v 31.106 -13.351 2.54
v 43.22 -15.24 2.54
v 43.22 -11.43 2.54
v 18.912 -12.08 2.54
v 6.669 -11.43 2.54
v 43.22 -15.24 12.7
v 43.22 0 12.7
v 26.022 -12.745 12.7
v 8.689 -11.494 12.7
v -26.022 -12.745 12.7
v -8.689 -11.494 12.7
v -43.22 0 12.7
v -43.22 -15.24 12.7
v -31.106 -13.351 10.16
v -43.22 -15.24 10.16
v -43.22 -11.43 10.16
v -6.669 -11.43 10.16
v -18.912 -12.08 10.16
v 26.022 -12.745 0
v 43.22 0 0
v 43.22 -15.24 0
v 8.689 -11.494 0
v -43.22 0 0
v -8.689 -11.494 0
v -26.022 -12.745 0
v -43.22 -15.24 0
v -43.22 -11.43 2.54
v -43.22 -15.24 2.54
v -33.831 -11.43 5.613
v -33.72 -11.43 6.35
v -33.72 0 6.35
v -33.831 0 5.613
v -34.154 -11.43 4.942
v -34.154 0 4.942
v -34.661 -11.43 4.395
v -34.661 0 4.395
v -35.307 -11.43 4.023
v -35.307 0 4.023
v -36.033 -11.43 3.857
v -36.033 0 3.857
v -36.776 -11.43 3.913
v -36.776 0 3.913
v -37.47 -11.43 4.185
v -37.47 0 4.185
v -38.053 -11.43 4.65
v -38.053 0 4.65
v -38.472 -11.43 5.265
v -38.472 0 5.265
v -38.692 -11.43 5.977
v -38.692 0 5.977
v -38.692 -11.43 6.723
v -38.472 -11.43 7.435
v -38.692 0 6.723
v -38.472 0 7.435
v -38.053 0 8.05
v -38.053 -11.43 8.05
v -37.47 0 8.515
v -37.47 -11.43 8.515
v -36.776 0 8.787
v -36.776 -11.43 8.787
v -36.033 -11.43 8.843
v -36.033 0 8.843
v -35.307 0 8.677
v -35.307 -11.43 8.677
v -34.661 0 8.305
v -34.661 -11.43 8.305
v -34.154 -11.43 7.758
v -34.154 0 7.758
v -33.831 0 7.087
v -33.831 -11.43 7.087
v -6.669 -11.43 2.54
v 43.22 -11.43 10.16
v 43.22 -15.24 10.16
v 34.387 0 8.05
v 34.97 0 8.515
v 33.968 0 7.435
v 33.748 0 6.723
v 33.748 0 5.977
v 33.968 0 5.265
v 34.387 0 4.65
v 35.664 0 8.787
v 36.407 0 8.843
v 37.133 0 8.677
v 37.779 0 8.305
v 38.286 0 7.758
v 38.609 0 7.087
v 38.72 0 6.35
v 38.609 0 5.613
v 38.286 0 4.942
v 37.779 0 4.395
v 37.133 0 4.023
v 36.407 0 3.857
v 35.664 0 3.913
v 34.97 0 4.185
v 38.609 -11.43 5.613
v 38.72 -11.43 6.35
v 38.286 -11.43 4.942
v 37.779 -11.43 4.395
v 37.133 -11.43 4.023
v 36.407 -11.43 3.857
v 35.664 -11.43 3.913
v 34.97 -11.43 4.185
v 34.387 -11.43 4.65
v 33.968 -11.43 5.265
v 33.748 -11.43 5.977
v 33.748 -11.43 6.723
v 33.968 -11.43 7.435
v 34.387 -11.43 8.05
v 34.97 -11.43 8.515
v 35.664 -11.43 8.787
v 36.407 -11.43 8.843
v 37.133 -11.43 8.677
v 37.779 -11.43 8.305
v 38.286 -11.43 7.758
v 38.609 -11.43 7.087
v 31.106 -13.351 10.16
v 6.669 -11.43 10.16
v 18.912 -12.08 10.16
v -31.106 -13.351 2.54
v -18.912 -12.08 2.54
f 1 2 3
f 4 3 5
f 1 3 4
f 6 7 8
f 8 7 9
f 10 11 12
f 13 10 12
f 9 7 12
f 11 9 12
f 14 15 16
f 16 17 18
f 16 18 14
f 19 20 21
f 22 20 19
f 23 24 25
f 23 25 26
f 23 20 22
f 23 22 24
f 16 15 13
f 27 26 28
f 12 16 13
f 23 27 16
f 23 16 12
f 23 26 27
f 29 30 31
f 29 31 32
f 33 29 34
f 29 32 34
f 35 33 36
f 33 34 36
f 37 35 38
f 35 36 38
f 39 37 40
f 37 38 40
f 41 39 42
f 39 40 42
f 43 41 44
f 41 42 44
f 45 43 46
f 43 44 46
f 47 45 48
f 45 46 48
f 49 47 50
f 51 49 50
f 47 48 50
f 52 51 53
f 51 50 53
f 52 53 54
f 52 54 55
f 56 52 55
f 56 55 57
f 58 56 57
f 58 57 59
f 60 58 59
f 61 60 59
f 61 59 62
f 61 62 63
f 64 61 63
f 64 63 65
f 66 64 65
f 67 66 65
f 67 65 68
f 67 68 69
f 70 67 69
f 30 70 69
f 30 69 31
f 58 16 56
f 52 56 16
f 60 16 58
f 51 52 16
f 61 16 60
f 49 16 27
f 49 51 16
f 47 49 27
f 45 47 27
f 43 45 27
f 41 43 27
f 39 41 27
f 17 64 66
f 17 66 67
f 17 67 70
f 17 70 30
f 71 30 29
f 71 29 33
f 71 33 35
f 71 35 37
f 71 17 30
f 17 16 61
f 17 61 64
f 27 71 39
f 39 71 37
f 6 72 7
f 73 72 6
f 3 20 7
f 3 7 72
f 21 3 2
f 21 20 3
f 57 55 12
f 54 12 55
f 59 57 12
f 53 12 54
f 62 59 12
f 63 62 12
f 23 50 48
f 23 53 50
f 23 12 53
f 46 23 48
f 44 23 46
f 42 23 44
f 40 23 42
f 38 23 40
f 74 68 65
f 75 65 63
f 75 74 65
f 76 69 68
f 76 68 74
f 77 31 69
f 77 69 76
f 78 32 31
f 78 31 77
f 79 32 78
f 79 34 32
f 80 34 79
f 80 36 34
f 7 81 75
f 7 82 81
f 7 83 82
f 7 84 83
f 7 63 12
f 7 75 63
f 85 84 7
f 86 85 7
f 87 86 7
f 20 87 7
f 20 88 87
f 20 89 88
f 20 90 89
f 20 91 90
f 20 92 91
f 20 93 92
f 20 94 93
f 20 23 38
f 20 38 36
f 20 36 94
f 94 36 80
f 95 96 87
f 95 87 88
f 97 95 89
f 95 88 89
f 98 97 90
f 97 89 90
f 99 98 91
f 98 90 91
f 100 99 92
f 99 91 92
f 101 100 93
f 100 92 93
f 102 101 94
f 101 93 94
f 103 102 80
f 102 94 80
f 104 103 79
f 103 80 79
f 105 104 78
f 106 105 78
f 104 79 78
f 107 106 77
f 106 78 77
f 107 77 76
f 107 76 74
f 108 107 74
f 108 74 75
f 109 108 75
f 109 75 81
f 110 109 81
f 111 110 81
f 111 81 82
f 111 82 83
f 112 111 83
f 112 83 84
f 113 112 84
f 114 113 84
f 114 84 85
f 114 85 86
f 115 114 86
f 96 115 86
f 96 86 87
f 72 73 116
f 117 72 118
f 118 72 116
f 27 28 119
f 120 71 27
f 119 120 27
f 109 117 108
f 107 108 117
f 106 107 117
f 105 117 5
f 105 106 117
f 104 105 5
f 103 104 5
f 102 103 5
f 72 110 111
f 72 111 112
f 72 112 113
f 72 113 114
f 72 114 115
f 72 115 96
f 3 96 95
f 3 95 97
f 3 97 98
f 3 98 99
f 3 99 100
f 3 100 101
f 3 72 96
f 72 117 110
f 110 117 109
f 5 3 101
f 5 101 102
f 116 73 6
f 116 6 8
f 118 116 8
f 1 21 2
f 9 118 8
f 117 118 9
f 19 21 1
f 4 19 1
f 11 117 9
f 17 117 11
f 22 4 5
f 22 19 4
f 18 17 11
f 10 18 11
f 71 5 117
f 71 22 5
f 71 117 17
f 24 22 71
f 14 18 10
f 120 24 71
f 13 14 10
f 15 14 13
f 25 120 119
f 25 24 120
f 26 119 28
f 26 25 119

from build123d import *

# Parameters (mm, degrees)
BOSS_EXTRUDE1_DEPTH = 12.7
SKETCH2_R           = 2.5
CUT_EXTRUDE1_DEPTH  = 16.24
SKETCH3_W           = 7.62
SKETCH3_H           = 3.81
CUT_EXTRUDE2_DEPTH  = 87.4400001


with BuildPart() as part:
    # Sketch1 → Boss-Extrude1 (new body)
    with BuildSketch(Plane.XY):
        with BuildLine():
            Line((-43.22, 0), (43.22, 0))
            Line((43.22, 0), (43.22, -15.24))
            ThreePointArc((43.22, -15.24), (0, -11.337812964), (-43.22, -15.24))
            Line((-43.22, -15.24), (-43.22, 0))
        make_face()
    extrude(amount=BOSS_EXTRUDE1_DEPTH)

    # Sketch2 → Cut-Extrude1 (cut, through all)
    with BuildSketch(Plane(origin=(0, 0, 0), x_dir=(1, 0, 0), z_dir=(0, 1, 0))):
        with Locations((-36.22, -6.35)):
            Circle(SKETCH2_R)
        with Locations((36.22, -6.35)):
            Circle(SKETCH2_R)
    extrude(amount=-CUT_EXTRUDE1_DEPTH, mode=Mode.SUBTRACT)

    # Sketch3 → Cut-Extrude2 (cut, through all)
    with BuildSketch(Plane(origin=(43.22, 0, 0), x_dir=(0, 0, -1), z_dir=(1, 0, 0))):
        with Locations((-6.35, -13.335)):
            Rectangle(SKETCH3_W, SKETCH3_H)
    extrude(amount=-CUT_EXTRUDE2_DEPTH, mode=Mode.SUBTRACT)


solid = part.part
